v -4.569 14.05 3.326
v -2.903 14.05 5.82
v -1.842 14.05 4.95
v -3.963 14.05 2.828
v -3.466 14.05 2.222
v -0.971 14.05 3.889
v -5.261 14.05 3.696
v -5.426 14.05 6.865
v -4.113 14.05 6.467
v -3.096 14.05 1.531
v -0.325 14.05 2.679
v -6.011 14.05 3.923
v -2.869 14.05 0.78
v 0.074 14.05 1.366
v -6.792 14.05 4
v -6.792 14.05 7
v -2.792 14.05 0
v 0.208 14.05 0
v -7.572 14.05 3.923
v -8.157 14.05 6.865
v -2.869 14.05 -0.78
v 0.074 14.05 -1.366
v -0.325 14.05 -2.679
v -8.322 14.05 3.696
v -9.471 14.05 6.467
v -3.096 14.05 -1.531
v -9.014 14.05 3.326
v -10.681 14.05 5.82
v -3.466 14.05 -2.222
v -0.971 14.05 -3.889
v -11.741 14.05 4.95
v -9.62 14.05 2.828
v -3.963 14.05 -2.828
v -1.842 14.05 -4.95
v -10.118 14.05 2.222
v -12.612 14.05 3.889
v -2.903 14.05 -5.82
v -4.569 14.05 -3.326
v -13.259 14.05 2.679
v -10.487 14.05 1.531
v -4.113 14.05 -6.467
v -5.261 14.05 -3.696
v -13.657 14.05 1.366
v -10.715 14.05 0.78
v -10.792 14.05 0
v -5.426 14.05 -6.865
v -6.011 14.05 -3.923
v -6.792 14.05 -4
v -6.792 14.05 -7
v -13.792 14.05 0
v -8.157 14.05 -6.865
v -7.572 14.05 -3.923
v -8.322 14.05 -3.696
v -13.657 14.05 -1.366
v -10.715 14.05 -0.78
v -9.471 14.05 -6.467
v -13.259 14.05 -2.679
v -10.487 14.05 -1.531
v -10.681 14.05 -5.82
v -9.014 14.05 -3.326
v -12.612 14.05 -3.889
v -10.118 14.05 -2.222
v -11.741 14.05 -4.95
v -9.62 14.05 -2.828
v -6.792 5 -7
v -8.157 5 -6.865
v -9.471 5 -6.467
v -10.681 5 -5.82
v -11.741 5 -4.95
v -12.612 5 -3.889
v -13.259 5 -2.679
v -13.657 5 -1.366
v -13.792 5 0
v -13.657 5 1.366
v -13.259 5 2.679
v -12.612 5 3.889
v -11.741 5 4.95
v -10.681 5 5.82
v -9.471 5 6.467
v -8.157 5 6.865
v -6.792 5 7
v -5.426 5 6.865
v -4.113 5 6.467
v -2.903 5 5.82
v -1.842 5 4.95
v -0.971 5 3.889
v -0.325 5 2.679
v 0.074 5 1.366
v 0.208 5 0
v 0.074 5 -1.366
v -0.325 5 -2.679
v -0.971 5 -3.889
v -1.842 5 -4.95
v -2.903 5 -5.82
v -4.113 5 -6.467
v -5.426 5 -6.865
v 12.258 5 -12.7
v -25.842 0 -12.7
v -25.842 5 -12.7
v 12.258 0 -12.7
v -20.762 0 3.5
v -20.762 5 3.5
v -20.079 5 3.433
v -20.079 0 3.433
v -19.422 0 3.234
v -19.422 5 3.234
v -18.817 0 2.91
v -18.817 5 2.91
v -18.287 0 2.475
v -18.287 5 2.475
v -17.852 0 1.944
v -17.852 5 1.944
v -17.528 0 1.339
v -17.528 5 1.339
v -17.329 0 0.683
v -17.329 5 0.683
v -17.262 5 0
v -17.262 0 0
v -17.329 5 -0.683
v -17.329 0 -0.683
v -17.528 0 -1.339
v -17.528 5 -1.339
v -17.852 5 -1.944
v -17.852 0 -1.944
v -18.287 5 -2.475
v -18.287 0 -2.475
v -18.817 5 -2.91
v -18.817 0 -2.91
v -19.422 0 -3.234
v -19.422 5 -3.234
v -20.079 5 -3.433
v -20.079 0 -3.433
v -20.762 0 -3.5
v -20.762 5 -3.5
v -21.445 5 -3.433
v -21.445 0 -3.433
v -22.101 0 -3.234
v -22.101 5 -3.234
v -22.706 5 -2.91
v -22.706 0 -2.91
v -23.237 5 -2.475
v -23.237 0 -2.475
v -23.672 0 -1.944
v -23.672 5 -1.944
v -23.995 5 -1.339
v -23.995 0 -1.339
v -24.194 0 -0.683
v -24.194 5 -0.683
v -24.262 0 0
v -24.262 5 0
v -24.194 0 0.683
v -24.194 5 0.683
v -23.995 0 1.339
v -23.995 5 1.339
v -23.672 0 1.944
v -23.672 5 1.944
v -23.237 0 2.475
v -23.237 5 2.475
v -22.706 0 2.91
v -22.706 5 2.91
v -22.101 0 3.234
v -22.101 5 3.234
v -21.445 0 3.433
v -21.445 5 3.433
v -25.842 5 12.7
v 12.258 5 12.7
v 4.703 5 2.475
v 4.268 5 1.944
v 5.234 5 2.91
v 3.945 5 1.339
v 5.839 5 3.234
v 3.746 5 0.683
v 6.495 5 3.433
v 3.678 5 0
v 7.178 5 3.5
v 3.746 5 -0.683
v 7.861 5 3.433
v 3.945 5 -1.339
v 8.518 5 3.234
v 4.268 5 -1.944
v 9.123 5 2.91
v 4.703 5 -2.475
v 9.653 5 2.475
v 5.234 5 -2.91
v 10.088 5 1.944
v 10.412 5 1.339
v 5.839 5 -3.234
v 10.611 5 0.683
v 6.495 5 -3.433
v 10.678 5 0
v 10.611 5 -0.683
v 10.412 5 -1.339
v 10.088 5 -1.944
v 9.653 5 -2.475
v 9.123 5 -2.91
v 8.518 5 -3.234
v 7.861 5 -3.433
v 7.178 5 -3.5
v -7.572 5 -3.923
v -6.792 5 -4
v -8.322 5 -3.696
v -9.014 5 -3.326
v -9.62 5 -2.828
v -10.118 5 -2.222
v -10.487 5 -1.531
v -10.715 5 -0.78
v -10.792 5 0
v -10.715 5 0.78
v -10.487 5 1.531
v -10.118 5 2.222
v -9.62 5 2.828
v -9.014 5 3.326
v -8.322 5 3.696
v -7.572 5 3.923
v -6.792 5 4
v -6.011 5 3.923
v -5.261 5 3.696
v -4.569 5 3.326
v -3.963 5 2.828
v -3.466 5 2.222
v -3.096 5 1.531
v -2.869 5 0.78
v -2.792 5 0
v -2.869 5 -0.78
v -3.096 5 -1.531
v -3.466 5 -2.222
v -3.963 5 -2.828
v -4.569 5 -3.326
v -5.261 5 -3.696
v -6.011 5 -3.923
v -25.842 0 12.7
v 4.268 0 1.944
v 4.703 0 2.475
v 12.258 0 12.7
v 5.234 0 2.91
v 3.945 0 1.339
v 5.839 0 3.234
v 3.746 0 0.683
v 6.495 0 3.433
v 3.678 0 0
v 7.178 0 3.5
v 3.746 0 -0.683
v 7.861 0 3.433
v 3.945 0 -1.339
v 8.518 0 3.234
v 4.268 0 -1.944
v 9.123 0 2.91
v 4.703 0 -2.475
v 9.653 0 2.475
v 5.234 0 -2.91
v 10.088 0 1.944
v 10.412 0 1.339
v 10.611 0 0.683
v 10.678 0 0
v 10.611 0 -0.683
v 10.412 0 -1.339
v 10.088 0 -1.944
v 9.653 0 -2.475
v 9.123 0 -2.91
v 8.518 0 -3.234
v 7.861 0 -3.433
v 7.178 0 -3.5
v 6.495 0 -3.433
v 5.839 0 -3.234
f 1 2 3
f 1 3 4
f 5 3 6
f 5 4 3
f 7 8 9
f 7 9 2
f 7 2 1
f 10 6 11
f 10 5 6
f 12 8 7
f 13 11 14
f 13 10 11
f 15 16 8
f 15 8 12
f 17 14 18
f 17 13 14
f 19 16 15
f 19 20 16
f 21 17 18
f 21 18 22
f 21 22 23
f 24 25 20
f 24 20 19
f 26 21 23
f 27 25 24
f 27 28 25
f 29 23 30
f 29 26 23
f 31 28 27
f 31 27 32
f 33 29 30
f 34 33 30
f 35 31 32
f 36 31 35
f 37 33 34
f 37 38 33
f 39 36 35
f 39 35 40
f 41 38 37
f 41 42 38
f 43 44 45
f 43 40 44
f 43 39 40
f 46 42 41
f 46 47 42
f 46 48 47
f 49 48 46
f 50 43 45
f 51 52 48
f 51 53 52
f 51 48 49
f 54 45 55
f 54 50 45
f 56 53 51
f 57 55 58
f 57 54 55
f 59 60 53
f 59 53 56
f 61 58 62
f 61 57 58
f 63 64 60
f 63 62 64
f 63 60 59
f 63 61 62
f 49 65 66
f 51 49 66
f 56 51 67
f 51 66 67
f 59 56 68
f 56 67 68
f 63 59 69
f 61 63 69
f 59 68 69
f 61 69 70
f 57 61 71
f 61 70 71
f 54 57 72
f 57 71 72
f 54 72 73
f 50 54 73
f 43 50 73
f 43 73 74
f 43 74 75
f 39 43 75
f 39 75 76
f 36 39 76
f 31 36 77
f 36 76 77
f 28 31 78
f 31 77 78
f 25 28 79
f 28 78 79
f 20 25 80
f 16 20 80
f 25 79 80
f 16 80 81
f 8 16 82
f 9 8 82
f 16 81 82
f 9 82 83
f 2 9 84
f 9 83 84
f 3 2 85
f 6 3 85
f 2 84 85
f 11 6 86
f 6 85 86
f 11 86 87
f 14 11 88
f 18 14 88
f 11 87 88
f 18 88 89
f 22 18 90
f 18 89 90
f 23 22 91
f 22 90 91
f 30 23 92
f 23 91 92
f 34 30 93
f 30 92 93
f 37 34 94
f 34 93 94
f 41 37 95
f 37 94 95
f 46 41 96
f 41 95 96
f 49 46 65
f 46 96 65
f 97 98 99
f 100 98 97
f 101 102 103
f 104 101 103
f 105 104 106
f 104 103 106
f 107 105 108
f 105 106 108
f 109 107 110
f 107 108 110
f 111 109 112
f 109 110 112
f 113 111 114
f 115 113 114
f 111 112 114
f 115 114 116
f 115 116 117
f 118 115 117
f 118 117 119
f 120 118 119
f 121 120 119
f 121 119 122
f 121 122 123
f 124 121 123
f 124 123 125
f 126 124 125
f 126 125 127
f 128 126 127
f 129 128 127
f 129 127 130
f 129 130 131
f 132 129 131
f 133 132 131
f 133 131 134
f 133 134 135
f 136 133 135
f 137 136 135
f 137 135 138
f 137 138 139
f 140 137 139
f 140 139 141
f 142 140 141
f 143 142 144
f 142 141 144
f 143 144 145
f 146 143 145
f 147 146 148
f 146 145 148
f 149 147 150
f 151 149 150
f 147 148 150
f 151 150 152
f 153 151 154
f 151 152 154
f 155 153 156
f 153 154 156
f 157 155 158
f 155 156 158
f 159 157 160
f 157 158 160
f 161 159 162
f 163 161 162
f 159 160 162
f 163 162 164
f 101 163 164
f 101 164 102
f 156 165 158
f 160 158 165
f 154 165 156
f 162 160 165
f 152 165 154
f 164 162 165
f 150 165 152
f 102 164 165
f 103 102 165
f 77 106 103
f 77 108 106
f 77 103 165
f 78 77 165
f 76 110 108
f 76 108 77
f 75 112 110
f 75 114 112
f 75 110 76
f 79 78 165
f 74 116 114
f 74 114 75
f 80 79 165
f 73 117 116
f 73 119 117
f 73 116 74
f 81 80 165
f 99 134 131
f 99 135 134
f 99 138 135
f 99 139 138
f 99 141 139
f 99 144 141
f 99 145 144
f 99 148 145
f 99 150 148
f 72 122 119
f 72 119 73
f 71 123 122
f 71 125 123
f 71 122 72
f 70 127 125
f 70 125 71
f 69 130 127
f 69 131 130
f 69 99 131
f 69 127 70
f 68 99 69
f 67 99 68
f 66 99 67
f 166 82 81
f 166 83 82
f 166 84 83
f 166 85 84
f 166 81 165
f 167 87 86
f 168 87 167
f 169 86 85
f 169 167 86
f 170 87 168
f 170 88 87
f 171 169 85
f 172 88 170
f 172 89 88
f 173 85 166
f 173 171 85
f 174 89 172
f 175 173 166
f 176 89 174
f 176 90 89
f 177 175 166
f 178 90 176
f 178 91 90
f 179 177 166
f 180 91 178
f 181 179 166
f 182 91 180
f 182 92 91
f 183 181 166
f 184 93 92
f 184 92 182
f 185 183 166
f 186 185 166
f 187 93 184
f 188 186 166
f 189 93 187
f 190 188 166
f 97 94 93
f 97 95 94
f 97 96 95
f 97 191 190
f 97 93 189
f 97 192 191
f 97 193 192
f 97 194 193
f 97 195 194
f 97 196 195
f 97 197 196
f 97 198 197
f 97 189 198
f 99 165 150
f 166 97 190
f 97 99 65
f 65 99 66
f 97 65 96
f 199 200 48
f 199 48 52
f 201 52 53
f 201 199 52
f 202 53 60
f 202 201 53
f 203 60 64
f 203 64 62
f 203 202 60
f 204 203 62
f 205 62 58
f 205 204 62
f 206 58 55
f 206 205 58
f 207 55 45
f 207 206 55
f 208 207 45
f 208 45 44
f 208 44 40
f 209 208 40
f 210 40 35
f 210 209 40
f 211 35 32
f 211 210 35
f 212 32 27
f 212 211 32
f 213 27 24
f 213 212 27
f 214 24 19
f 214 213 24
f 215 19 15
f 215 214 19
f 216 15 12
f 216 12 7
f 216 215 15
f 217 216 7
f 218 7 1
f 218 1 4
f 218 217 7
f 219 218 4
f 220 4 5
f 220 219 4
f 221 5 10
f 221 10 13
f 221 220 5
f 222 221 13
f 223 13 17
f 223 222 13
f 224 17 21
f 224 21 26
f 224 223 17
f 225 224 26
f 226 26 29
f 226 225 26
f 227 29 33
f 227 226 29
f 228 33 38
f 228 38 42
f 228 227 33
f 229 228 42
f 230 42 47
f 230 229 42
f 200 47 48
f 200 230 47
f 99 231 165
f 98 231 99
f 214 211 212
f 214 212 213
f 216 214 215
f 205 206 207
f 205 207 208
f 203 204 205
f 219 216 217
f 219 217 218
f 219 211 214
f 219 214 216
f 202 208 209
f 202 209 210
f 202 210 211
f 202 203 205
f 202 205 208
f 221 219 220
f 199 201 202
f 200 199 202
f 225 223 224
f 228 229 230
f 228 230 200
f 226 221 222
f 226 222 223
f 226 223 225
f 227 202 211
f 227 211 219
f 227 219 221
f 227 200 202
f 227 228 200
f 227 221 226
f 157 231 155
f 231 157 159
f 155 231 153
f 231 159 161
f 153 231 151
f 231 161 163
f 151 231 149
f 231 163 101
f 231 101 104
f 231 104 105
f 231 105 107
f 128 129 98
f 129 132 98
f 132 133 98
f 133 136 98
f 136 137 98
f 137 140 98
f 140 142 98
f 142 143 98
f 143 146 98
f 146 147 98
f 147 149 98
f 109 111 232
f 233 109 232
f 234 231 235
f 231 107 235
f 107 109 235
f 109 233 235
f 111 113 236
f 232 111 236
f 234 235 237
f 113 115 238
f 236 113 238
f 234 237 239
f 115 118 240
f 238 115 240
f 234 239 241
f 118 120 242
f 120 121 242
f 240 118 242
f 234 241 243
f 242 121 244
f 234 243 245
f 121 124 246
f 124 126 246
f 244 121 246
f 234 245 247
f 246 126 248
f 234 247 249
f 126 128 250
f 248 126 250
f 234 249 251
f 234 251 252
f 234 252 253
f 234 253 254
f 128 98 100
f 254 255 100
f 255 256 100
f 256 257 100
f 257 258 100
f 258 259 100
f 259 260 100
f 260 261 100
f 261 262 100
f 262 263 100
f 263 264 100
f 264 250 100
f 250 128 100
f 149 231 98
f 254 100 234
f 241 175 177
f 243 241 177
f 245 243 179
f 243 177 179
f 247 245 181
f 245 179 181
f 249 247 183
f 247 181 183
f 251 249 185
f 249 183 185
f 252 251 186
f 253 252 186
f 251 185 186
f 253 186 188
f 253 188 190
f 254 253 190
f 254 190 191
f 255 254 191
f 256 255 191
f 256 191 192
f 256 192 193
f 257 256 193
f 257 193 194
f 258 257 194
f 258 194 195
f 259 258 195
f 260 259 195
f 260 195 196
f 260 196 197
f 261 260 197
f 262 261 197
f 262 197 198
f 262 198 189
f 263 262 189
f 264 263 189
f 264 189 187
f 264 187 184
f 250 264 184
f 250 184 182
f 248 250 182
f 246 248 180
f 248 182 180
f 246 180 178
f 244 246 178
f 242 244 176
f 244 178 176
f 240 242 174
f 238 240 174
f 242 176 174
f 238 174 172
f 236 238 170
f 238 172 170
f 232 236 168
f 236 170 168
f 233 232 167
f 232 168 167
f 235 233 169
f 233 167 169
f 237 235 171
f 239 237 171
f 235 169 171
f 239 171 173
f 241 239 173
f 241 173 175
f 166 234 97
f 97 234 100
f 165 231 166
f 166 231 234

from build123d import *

# Parameters (mm, degrees)
SKETCH1_W           = 38.1
SKETCH1_H           = 25.4
BOSS_EXTRUDE1_DEPTH = 5
SKETCH3_R           = 7
SKETCH3_R_2         = 4
BOSS_EXTRUDE2_DEPTH = 9.05
SKETCH4_R           = 3.5
CUT_EXTRUDE1_DEPTH  = 31.182577446


with BuildPart() as part:
    # Sketch1 → Boss-Extrude1 (new body)
    with BuildSketch(Plane(origin=(0, 0, 0), x_dir=(1, 0, 0), z_dir=(0, 1, 0))):
        with Locations((-6.79173913, 0)):
            Rectangle(SKETCH1_W, SKETCH1_H)
    extrude(amount=BOSS_EXTRUDE1_DEPTH)

    # Sketch3 → Boss-Extrude2 (add)
    with BuildSketch(Plane(origin=(0, 5, 0), x_dir=(1, 0, 0), z_dir=(0, 1, 0))):
        with Locations((-6.79173913, 0)):
            Circle(SKETCH3_R)
        with Locations((-6.79173913, 0)):
            Circle(SKETCH3_R_2, mode=Mode.SUBTRACT)
    extrude(amount=BOSS_EXTRUDE2_DEPTH)

    # Sketch4 → Cut-Extrude1 (cut, through all)
    with BuildSketch(Plane(origin=(0, 5, 0), x_dir=(1, 0, 0), z_dir=(0, 1, 0))):
        with Locations((7.17826087, 0)):
            Circle(SKETCH4_R)
        with Locations((-20.76173913, 0)):
            Circle(SKETCH4_R)
    extrude(amount=-CUT_EXTRUDE1_DEPTH, mode=Mode.SUBTRACT)


solid = part.part
